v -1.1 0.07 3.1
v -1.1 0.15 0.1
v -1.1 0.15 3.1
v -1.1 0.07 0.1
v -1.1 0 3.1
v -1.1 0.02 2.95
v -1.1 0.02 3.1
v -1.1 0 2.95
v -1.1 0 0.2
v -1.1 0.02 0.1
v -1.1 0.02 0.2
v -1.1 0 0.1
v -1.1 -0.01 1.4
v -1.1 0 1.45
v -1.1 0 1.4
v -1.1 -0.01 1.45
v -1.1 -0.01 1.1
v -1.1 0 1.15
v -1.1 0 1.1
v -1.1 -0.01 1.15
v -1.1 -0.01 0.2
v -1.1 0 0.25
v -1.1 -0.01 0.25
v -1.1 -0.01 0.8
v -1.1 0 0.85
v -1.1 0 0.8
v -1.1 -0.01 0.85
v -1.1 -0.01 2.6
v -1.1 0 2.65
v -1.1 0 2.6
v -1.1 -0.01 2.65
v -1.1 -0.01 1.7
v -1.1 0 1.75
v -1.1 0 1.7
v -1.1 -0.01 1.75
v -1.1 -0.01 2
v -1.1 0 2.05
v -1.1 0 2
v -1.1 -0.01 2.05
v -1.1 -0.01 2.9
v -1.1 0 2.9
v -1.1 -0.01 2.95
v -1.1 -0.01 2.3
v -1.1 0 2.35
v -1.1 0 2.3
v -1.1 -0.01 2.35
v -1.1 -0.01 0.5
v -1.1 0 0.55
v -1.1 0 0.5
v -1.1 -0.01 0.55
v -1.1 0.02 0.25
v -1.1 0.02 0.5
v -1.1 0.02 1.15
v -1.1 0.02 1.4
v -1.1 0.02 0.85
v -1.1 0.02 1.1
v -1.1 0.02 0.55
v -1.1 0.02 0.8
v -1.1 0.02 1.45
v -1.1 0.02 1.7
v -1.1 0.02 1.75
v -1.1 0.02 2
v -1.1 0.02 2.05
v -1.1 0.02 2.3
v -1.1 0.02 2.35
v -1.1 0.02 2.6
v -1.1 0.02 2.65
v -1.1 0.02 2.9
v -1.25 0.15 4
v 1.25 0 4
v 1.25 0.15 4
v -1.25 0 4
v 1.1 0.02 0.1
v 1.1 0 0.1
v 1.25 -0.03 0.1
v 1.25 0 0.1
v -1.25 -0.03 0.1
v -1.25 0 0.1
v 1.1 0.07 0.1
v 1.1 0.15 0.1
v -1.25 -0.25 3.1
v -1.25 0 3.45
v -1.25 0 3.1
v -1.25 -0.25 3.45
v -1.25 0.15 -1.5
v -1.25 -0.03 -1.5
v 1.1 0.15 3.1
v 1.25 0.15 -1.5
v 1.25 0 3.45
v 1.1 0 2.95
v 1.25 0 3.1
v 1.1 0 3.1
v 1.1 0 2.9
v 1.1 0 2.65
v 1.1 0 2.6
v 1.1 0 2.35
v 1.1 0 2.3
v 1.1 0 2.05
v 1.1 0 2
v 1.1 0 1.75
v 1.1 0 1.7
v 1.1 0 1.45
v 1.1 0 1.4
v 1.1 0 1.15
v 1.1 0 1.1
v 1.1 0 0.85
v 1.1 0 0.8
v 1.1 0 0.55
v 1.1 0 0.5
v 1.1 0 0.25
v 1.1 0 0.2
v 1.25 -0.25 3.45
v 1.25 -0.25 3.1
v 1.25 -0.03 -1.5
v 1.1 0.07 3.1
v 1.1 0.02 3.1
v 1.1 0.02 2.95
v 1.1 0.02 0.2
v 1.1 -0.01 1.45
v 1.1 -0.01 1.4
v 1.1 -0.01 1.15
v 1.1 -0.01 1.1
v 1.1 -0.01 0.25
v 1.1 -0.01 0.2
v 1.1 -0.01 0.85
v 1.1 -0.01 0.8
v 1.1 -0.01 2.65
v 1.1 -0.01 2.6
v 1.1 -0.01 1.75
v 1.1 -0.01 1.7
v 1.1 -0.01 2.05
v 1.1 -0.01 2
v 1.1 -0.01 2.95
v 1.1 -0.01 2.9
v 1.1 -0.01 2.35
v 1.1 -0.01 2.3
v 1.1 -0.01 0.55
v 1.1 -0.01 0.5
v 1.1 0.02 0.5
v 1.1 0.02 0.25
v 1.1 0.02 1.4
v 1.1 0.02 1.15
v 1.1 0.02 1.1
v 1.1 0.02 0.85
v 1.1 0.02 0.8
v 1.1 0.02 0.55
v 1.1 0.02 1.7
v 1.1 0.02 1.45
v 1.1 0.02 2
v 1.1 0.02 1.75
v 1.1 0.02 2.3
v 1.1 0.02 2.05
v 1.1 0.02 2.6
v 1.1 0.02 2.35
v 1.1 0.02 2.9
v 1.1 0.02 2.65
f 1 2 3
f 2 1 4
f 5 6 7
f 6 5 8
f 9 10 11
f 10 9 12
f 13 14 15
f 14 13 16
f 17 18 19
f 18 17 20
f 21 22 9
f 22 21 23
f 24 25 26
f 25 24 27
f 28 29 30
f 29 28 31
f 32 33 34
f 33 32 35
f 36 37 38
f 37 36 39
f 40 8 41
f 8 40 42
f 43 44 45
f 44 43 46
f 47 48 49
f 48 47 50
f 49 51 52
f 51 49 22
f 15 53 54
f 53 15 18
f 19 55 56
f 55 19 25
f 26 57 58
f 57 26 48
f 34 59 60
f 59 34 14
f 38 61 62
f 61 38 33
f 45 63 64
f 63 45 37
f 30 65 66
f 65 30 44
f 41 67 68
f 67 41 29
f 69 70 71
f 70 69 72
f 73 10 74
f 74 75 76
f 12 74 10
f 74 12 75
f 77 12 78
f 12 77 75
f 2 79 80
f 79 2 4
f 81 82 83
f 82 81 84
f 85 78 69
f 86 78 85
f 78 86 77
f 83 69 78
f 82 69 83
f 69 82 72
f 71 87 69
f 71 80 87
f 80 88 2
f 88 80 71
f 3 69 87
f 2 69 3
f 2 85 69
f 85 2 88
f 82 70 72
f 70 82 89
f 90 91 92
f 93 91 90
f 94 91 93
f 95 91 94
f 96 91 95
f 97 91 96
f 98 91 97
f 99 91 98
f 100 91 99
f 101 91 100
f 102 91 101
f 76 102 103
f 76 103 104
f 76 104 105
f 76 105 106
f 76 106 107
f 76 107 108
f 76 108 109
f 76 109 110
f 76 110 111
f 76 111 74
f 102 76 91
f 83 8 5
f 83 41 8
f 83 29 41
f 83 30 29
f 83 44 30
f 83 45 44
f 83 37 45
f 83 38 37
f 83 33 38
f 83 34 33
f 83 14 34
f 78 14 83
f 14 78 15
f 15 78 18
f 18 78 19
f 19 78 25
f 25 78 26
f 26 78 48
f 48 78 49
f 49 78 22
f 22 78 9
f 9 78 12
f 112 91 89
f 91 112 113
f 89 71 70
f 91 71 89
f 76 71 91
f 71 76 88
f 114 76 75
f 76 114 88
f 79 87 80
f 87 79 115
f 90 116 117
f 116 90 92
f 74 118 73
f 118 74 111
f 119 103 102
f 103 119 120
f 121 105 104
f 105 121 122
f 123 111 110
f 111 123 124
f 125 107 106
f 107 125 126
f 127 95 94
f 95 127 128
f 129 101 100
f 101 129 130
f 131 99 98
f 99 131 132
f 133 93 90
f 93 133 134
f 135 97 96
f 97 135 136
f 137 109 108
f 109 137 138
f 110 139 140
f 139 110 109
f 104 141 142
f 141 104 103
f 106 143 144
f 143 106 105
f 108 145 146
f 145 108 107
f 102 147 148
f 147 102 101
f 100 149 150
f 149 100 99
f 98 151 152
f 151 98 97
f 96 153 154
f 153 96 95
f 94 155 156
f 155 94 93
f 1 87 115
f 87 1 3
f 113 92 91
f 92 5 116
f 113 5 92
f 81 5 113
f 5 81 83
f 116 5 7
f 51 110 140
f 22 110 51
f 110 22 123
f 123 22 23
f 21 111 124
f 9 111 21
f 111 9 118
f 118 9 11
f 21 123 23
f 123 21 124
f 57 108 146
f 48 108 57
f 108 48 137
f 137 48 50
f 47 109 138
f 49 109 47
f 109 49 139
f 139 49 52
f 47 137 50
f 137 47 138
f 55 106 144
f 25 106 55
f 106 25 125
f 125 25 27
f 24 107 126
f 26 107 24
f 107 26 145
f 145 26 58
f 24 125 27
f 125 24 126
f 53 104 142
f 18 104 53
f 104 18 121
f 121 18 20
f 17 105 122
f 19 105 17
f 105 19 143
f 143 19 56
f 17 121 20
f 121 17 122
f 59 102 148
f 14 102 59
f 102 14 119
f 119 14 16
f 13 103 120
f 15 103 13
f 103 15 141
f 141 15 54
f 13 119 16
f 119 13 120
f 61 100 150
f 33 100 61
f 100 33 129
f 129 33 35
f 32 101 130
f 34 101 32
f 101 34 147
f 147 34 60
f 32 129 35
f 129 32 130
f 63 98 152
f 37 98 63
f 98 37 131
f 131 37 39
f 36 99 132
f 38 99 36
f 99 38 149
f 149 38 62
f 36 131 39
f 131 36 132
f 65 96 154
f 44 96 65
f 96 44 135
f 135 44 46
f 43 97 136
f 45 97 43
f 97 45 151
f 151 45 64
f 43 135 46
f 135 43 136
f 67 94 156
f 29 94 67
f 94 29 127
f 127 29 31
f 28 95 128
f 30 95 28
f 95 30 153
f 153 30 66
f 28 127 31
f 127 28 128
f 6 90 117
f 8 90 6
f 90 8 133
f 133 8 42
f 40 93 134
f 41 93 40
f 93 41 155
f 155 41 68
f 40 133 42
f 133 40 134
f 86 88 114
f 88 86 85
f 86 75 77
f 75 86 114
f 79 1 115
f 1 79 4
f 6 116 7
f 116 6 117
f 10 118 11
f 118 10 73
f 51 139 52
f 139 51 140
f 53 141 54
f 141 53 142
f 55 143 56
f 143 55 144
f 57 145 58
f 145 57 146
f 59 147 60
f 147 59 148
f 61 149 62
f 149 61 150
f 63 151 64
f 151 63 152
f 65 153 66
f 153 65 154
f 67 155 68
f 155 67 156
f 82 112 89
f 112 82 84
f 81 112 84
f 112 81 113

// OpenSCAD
// Shed shell kit: door. See lib/lodge_kit.scad.
include <lib/lodge_kit.scad>
kind = "shed";
door();
